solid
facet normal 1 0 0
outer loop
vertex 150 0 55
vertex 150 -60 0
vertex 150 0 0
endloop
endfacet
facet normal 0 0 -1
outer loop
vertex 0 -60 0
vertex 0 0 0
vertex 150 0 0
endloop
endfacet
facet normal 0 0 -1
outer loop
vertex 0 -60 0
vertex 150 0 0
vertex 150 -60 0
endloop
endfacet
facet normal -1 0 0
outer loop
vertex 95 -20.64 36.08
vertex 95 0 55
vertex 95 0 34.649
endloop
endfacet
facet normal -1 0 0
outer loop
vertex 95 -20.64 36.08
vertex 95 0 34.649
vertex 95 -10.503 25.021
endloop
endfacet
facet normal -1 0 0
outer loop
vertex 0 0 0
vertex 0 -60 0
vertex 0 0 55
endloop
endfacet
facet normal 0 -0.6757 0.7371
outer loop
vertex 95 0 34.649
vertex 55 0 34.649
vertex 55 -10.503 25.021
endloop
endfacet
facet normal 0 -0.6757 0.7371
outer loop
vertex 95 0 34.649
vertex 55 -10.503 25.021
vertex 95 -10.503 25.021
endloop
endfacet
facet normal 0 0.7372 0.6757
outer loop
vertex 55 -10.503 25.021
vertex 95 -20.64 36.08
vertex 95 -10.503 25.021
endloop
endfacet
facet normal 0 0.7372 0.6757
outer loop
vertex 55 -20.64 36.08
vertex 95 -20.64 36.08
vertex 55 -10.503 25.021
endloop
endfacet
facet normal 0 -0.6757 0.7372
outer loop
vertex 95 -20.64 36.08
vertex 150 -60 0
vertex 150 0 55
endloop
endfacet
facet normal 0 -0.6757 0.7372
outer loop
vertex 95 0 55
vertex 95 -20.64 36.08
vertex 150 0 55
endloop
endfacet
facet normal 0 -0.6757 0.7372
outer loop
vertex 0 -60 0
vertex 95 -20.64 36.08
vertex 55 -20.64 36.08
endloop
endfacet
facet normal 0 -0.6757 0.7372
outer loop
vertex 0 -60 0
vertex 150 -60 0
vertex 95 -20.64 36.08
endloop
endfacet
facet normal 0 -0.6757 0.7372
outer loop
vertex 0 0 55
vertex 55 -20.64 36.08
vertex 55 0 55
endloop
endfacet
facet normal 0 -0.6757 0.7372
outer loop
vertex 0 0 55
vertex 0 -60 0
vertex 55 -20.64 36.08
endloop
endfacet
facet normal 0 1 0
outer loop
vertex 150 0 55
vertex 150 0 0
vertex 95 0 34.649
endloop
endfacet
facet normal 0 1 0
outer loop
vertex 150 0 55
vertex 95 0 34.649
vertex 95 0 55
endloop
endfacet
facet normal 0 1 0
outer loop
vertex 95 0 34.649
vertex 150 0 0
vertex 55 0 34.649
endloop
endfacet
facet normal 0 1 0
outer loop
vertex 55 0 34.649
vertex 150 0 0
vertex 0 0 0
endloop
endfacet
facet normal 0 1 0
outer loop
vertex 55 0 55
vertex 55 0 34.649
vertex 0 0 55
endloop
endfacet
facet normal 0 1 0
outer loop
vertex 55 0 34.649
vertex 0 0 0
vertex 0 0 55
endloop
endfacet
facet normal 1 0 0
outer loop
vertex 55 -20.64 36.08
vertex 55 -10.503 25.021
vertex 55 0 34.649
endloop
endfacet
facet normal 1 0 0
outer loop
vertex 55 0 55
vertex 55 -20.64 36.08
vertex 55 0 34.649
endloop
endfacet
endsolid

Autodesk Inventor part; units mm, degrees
ref_plane "YZ Plane" through (0, 0, 0) normal (1, 0, 0) x (0, 1, 0)
ref_plane "XZ Plane" through (0, 0, 0) normal (0, 1, 0) x (-1, 0, 0)
ref_plane "XY Plane" through (0, 0, 0) normal (0, 0, 1) x (1, 0, 0)
sketch "Szkic1" plane through (0, 0, 0) normal (1, 0, 0) x (0, 1, 0)
  line L0 (0, 0) -> (0, 55)
  line L1 (0, 0) -> (-60, 0)
  line L2 (-60, 0) -> (0, 55)
  dimension "d0" = 55
  dimension "d1" = 60
extrude "Wyciągnięcie proste1" add sketch "Szkic1" along normal blind 150
sketch "Szkic2" plane through (0, -60, 0) normal (0, -0.6757246, 0.7371541) x (1, 0, 0)
  line L0 (0, 81.3941) -> (150, 81.3941) projected
  line L1 (55, 81.3941) -> (95, 81.3941)
  line L2 (95, 81.3941) -> (95, 65.3941)
  line L3 (95, 65.3941) -> (55, 65.3941)
  line L4 (55, 65.3941) -> (55, 81.3941)
  point P0 (0, 44.2292)
  dimension "d4" = 40
  dimension "d5" = 16
extrude "Wyciągnięcie proste2" cut sketch "Szkic2" against normal blind 15
sketch "Szkic3" plane through (0, -60, 0) normal (0, -0.6757246, 0.7371541) x (1, 0, 0)
  line L0 (55, 65.3941) -> (95, 65.3941)
  line L1 (95, 65.3941) -> (95, 59.3941)
  line L2 (95, 59.3941) -> (55, 59.3941)
  line L3 (55, 59.3941) -> (55, 65.3941)
  point P0 (0, 44.2292)
  dimension "d8" = 40
  dimension "d9" = 6
extrude "Wyciągnięcie proste3" cut sketch "Szkic3" against normal blind 15
sketch "Szkic4" plane through (0, -60, 0) normal (0, -0.6757246, 0.7371541) x (1, 0, 0)
  line L0 (55, 59.3941) -> (95, 59.3941)
  line L1 (95, 59.3941) -> (95, 53.3941)
  line L2 (95, 53.3941) -> (55, 53.3941)
  line L3 (55, 53.3941) -> (55, 59.3941)
  point P0 (0, 44.2292)
  dimension "d12" = 40
  dimension "d13" = 6
extrude "Wyciągnięcie proste4" cut sketch "Szkic4" against normal blind 15
properties part number "klin" material "Brąz, odlew"
